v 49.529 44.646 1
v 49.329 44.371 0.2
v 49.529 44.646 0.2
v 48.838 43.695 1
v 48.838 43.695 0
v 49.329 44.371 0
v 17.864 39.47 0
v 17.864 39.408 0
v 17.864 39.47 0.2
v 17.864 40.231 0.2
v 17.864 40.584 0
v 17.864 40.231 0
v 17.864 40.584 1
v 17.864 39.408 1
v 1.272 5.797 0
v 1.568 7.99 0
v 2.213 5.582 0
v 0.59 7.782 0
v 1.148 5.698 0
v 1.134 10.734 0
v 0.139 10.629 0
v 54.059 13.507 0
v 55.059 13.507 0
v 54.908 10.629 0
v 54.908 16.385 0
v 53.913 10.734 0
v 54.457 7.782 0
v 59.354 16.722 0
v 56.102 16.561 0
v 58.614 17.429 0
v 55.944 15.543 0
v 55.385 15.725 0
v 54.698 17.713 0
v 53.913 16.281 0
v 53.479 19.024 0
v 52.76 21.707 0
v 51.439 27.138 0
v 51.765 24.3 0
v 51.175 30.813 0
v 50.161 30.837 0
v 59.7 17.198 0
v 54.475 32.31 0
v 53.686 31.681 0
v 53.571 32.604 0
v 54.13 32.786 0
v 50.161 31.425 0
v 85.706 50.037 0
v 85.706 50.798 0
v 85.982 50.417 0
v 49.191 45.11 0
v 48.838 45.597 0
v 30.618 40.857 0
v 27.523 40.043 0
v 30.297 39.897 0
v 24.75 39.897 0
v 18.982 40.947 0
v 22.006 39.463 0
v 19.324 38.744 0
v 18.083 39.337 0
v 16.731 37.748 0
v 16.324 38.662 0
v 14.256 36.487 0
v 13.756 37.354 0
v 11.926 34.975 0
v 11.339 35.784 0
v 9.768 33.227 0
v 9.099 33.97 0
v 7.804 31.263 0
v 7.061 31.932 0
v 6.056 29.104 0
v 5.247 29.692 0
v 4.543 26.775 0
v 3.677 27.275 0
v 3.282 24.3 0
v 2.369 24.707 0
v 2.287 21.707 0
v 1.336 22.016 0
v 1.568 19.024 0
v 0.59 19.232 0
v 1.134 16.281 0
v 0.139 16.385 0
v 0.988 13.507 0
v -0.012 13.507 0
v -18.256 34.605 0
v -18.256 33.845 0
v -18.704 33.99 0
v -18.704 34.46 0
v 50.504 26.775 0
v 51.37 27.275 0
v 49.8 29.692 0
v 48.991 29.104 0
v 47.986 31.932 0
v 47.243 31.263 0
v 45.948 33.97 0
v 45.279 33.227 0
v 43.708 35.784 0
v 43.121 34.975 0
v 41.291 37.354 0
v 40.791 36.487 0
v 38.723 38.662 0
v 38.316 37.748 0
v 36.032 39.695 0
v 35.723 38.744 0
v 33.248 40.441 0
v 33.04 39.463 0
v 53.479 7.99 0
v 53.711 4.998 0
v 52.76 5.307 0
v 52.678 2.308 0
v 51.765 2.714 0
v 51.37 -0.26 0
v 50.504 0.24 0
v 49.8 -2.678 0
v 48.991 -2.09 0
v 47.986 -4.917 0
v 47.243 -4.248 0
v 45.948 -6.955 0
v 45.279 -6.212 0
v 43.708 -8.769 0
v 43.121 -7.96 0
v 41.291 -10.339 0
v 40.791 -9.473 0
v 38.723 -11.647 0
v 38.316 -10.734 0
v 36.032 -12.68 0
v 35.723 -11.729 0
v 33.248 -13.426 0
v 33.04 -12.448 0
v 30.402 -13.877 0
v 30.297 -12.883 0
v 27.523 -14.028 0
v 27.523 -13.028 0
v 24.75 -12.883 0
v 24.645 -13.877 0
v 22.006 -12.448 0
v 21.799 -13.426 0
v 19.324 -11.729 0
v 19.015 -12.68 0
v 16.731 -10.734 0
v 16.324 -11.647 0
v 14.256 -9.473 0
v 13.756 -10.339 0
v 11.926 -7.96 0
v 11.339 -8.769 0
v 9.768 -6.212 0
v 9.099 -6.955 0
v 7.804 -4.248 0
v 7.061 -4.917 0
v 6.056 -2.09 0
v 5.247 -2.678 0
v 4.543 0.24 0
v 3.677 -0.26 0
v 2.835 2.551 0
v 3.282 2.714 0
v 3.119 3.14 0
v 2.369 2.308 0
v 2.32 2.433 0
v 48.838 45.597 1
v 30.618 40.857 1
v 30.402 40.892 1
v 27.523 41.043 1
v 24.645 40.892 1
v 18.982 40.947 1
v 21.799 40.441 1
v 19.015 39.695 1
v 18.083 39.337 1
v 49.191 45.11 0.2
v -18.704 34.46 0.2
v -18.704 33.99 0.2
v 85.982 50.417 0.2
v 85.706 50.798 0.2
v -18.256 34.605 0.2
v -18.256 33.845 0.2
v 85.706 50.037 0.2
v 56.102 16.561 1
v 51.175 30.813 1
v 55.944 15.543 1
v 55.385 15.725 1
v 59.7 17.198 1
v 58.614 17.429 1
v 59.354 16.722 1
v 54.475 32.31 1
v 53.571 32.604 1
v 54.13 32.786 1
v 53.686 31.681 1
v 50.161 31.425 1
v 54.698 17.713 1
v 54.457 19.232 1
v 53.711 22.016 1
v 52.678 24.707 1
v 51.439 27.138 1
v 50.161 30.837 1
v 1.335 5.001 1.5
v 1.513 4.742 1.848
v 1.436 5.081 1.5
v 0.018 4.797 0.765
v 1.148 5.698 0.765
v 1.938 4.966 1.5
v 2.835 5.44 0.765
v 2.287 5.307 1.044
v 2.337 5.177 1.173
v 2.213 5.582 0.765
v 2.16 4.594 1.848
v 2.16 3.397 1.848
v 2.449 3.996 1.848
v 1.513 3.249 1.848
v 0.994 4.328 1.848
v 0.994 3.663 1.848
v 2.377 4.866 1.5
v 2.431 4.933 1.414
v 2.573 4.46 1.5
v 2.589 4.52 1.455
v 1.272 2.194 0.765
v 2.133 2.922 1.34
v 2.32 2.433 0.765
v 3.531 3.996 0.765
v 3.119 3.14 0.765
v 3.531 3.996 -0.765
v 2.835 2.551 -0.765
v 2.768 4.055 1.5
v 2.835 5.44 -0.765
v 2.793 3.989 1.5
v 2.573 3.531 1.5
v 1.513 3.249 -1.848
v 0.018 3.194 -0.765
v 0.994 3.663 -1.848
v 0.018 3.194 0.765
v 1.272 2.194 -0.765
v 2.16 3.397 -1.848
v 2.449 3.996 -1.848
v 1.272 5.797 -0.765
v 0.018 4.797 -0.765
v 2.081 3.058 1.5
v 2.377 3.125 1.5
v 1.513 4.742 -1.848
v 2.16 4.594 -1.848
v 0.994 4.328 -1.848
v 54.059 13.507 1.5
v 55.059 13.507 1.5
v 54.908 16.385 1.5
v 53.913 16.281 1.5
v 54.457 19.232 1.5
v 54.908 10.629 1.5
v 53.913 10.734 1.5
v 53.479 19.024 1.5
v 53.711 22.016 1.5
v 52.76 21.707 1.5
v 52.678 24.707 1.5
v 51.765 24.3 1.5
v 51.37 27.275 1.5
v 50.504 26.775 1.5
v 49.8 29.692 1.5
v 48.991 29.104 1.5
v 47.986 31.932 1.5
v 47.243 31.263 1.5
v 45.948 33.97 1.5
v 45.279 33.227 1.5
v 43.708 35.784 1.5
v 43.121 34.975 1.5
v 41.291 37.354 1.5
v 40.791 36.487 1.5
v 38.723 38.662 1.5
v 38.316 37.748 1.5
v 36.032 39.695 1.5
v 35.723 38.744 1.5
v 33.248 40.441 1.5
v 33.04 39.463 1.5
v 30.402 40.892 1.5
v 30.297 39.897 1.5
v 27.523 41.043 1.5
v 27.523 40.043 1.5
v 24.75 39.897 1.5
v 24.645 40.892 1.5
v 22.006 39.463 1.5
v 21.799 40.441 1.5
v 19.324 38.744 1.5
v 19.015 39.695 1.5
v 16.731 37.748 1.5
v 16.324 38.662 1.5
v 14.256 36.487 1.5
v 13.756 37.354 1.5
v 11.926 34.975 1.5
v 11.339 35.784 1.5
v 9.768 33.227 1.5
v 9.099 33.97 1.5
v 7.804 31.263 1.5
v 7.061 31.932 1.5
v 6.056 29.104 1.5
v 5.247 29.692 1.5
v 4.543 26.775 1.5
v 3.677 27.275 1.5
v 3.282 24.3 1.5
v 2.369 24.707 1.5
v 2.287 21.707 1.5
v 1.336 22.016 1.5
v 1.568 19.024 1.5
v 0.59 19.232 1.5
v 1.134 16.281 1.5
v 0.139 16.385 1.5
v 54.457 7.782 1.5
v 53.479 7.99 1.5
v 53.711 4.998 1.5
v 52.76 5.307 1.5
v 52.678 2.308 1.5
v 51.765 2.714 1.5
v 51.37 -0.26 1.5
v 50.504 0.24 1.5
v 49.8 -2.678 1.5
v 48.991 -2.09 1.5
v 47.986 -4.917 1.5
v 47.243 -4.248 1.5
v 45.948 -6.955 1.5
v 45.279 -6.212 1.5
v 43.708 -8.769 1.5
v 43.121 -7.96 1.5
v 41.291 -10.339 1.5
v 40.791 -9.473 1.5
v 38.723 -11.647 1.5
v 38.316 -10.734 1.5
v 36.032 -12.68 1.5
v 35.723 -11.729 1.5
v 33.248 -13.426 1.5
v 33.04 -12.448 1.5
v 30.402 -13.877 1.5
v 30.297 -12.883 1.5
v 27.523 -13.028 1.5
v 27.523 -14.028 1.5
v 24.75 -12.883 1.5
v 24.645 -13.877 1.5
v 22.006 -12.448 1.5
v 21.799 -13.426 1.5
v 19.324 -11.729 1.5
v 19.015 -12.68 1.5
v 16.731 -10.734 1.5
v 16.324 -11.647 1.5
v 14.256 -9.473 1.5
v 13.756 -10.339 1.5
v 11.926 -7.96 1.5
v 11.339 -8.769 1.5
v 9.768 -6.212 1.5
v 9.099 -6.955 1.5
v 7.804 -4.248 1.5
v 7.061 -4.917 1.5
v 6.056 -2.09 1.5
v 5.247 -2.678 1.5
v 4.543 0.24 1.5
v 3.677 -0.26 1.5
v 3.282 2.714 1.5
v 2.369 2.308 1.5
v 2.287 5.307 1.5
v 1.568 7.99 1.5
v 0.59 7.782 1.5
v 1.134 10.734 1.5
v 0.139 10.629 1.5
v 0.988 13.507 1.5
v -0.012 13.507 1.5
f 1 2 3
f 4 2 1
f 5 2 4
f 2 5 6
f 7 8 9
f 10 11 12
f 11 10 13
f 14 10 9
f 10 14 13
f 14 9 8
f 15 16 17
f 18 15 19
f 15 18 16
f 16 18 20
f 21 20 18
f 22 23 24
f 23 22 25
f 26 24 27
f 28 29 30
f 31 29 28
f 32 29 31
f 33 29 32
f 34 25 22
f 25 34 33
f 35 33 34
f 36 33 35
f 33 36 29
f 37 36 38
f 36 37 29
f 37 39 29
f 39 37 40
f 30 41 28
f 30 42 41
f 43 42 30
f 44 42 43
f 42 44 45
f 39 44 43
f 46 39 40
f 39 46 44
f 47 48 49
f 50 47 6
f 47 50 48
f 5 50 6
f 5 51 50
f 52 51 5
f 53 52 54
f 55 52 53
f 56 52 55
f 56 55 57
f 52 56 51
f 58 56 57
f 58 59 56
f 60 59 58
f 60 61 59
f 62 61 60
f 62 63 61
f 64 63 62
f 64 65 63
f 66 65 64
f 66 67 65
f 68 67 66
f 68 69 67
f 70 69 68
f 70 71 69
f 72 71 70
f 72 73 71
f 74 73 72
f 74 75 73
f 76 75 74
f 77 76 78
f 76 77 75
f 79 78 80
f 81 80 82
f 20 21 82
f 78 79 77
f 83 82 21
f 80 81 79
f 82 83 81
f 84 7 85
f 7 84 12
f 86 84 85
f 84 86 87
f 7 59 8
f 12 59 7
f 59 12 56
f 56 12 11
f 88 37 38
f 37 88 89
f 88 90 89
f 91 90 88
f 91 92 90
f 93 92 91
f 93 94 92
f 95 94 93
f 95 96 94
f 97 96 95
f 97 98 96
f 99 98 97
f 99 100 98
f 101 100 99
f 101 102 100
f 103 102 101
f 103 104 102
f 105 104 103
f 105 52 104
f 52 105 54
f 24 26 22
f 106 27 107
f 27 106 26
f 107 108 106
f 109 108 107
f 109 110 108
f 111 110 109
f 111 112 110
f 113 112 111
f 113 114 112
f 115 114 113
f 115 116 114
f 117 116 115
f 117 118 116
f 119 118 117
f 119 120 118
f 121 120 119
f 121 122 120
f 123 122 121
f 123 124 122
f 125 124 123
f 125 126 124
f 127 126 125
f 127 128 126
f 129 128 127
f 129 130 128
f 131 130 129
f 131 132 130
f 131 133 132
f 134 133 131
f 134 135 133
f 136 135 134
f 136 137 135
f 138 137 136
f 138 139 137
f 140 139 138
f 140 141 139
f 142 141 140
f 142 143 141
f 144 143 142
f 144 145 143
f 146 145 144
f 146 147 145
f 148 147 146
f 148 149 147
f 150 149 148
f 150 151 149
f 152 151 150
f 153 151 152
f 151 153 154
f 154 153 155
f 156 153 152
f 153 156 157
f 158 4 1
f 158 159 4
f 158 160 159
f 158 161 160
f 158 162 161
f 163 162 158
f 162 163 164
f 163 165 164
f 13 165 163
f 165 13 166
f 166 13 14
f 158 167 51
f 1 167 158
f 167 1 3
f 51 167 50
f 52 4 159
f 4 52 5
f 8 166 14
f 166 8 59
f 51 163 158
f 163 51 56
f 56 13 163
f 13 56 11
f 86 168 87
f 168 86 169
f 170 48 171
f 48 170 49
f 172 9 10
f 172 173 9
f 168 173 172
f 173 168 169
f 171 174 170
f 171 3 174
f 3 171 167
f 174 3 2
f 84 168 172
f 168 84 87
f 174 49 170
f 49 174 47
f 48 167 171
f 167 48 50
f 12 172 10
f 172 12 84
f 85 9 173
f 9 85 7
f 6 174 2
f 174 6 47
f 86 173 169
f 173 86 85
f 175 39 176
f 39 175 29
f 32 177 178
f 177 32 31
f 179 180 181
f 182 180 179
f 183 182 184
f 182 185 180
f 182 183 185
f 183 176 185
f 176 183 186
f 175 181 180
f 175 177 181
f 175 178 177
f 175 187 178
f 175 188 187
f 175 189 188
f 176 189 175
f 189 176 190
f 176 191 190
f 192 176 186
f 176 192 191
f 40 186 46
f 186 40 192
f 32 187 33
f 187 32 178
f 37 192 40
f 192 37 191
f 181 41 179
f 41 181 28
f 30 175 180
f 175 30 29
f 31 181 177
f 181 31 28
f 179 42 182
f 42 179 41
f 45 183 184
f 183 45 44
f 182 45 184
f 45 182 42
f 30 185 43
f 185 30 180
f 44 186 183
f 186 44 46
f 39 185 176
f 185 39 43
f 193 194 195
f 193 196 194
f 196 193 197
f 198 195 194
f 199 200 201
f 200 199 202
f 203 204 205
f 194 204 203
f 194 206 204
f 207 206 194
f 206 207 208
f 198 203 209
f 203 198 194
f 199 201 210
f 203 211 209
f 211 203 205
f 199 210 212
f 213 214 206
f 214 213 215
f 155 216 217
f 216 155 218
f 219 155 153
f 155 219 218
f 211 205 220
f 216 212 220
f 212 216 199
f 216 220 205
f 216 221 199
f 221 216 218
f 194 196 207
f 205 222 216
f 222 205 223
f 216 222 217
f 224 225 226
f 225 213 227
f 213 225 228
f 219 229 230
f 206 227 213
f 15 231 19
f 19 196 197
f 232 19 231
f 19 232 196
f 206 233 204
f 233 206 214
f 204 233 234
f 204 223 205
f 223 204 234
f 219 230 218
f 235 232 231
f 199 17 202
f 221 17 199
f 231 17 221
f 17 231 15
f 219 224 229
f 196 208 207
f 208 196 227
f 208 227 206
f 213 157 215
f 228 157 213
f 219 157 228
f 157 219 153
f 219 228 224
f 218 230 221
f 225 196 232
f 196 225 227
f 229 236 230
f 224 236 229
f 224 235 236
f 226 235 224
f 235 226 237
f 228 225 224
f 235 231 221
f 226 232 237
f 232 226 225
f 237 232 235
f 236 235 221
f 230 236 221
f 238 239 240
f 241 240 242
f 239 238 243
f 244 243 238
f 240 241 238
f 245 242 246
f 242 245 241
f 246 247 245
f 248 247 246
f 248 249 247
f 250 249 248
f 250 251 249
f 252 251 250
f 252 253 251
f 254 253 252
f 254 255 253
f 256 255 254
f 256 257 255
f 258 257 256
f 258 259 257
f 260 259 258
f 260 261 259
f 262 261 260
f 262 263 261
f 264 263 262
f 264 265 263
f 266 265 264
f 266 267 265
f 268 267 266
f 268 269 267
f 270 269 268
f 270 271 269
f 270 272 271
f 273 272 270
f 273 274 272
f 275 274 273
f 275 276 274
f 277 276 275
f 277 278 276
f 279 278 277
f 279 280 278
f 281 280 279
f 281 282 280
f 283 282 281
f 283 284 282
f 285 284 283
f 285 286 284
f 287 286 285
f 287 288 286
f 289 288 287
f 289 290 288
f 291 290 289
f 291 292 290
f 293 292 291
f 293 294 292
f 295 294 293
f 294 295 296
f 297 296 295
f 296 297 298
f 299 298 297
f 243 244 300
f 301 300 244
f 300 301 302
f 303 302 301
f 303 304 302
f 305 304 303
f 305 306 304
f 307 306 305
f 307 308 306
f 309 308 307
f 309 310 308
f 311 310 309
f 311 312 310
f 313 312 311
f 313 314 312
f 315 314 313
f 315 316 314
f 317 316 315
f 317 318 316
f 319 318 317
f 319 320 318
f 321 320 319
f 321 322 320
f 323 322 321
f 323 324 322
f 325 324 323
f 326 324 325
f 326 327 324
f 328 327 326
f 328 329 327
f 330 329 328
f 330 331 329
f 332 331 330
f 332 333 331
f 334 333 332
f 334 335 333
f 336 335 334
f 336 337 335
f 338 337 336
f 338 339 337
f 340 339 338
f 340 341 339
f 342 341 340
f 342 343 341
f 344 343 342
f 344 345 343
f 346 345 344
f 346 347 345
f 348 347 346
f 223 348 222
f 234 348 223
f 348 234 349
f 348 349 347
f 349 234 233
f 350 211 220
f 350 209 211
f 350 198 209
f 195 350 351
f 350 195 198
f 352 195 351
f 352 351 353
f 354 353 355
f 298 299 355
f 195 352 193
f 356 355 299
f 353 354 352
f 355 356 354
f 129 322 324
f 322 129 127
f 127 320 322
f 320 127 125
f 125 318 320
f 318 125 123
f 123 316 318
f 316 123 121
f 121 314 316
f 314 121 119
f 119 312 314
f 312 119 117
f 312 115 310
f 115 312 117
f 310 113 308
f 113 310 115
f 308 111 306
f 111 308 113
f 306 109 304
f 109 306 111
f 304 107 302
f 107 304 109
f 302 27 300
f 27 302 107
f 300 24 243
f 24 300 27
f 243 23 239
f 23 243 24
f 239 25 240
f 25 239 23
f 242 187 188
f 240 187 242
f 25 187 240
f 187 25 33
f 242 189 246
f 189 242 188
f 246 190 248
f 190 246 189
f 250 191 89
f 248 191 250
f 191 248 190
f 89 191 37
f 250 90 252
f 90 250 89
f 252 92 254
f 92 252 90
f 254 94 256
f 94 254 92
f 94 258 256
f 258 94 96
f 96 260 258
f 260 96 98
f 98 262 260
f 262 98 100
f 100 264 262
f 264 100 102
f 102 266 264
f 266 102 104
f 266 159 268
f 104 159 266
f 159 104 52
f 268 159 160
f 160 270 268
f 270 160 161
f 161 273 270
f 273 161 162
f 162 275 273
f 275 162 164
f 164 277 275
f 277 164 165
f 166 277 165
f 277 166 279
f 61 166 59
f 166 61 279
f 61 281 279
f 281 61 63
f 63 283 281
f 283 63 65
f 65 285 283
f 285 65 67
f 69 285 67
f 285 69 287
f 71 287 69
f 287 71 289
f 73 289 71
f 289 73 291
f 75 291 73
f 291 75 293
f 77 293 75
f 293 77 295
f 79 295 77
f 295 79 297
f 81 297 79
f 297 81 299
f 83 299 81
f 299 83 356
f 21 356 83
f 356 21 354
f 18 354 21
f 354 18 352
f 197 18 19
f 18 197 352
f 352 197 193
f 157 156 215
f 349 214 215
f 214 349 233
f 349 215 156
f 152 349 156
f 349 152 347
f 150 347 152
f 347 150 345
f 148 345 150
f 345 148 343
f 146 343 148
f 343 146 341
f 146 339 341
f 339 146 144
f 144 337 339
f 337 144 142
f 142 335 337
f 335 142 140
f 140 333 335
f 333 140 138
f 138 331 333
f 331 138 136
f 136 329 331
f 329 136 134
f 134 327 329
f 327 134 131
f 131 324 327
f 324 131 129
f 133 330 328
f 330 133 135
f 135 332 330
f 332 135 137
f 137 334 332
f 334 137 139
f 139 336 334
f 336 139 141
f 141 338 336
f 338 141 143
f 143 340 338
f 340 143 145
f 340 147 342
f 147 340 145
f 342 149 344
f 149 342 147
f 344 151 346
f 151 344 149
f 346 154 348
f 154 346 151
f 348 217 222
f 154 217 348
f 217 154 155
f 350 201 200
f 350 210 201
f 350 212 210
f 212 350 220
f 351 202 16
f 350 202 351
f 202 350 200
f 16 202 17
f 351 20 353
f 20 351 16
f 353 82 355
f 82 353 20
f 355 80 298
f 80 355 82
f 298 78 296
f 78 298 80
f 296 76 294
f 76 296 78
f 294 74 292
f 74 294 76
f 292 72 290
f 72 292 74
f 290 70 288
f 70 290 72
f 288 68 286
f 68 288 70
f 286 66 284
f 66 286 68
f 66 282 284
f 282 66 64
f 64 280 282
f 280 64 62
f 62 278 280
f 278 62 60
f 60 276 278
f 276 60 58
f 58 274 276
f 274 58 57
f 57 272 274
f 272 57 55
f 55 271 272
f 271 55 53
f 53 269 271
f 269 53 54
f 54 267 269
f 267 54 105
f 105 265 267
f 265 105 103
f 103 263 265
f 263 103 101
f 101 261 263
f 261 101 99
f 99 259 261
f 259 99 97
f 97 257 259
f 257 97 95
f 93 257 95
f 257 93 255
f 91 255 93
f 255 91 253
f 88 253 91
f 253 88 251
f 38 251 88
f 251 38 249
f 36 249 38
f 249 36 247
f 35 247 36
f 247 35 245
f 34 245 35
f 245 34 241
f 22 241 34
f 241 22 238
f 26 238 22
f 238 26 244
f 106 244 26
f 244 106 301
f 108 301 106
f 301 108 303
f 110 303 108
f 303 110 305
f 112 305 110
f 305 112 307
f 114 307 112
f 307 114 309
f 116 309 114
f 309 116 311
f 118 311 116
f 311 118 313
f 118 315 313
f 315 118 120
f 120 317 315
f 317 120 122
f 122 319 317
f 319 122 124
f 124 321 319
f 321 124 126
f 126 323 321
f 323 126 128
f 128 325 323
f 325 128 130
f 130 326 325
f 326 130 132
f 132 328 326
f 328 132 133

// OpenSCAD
threshold = 1e-5;
workarea = 50;


function  AcmeSolver(f0, f1, f2, ifind = undef, maxi = 6000) =
let (
find = ifind == undef ? 
    (featurecenter(f0)   + featurecenter(f1)  
    + featurecenter(f2)  ) /3: ifind, 
d0 =distancetofeature(f0, find), 
nf0 = normaltofeature(f0, find),
d1 = distancetofeature(f1, find), 
nf1 = normaltofeature(f1, find),
d2 = distancetofeature(f2, find), 
nf2 = normaltofeature(f2, find),
sum = abs(d0 - d1) + abs(d1 - d2) + abs(d2 - d0), 
avrg = (d0 + d2 +    d1) / 3,  
cf0 = (find + nf0 * (max(0, d0) - avrg) * 0.999),  
cf1 = (    find + nf1 * (max(0, d1) - avrg) * 0.999),  
cf2 = (find + nf2 * (    max(0, d2) - avrg) * 0.999),  
newfind = (cf0 + cf1 + cf2) / 3 )
sum < threshold || maxi < 0 ? 
[find, avrg,   sum]
:  AcmeSolver(f0,
f1, f2, newfind, maxi - 1);

function featurecenter(feat) = 
len(feat) == 2 && len(feat[0]) ==  undef ? feat :
len(feat) == 3 && len(feat[0]) == undef ? [feat.x,feat.y] : 
len(feat) == 2 && len(feat[0]) == 2 ? (feat[0] + feat[1]) /2 :
len(feat) == 2 && len(feat[0]) == 2 ? (feat[0] + feat[1]+feat[2] + feat[3]) /  4 : [0, 0];

function distancetofeature(feat, find) = 
len(feat) == 2 && len(feat[0]) ==  undef ? norm(feat - find) : 
len(feat) == 3 && len(feat[0]) == undef ?  distancetocircle(feat, find) : 
len(feat) == 2 && len(feat[0]) == 2 ?  distancetoline(feat, find) : 
len(feat) == 4 && len(feat[0]) == 2 ?  distancetosquare(feat, find) :
0;

function normaltofeature(feat, find) = 
len(feat) == 2 && len(feat[0]) ==  undef ? normaltopoint(feat, find) :
 len(feat) == 3 && len(feat[0]) ==  undef ? normaltocircle(feat, find) : 
len(feat) == 2 && len(feat[0]) ==  2 ? normaltoline(feat, find) :
len(feat) == 4 && len(feat[0]) ==  2 ? normaltosquare(feat, find) :
 0;

function distancetopoint(point, find) = norm(point - find);

function distancetocircle(circle, find) = norm([circle.x, circle.y] -
  find) - circle[2];

function distancetoline(line, p) =
let (a = line[0], b = line[1], pa = p - a, ba = b - a, h =  ((pa * ba) /
  (ba * ba)))norm(pa - ba * h);

function distancetosquare(square, p) =min (
distancetosegment([square[0],square[1]],p),
distancetosegment([square[1],square[2]],p),
distancetosegment([square[2],square[3]],p),
distancetosegment([square[3],square[0]],p)

);

function distancetosegment(line, p) =
let (a = line[0], b = line[1], pa = p - a, ba = b - a, h =  clamp((pa * ba) /
  (ba * ba)))
norm(pa - ba * h);
function clamp(a, b = 0, c = 1) = min(max(a, b), c); 

function normaltopoint(point, find) = (point - find) / norm(point -
  find);

function normaltocircle(circle, find) = ([circle.x, circle.y] - find) /
norm([circle.x, circle.y] - find);

function normaltoline(line, find) =
let (a = line[0], b = line[1], dtl2 = distancetoline(line, find))
un([distancetoline(line, find + [-1, 0]) - dtl2, distancetoline(line,
  find + [0, -1]) - dtl2]);
function normaltosegment(line, find) =
let (a = line[0], b = line[1],c=un(a-b))[-c.y,c.x];
 

function normaltosquare(square, find) =
let (  base = distancetosquare(square, find))
un([distancetosquare(square, find + [-1, 0]) - base, distancetosquare(square, find+ [0, -1]) - base]);
function un(v) = v / max(1e-15, norm(v));

// demo code

function allines(f0,f1,f2)=isline(feature0)&&isline(feature1)&&isline(feature2);
function isline(feat)=len(feat) == 2 && len(feat[0]) == 2 ?true:false;
function randomfeature(i) =
let (s0 = i==undef? round( rnd(3)):i
)
(s0 == 0) ? [rnd(workarea), rnd(workarea), rnd(1, workarea * 0.5)] :
(s0 == 1) ? [rnd(workarea), rnd(workarea)] : 
(s0 == 2) ? [[rnd(  workarea), rnd(workarea)], [rnd(workarea), rnd(workarea)]] :
(s0 == 3) ? let(p1=[rnd(workarea), rnd(workarea)],p2=p1+[rnd(workarea)/2, rnd(workarea)/2],r=rnd(360),p3=(p1+p2)/2)
[rotp(r,p1,p3),rotp(r,[p2.x,p1.y],p3),rotp(r,p2,p3),rotp(r,[p1.x,p2.y],p3) ] :
 ["err"];

function rotp(r,ip,p3)=
let( p=ip-p3, s = sin(r),
  c = cos(r),
    xnew = p.x * c - p.y * s,
    ynew = p.x * s + p.y * c)
[xnew,ynew]+p3
;
module showfeature(feat) {
  color("black") {
    if (len(feat) == 2 && len(feat[0]) == undef) {
      echo(" point ", feat);
      translate(feat) sphere(2);
    }
    if (len(feat) == 3 && len(feat[0]) == undef) {
      echo(" circle ", feat);
      linear_extrude(1)translate([feat.x, feat.y]) difference() {
        circle(feat[2]);
        circle(feat[2] - 1);
      }
    }
    if (len(feat) == 2 && len(feat[0]) == 2) {
      echo(" line ", feat);
      linear_extrude(1)hull() {
        translate(feat[0]) circle(1);
        translate(feat[1]) circle(1);
      }
      n1 = un(feat[0] - feat[1]);
      linear_extrude(0.2)hull() {
        translate(feat[0] + n1 * workarea*0.75) circle(0.4);
        translate(feat[1] - n1 * workarea*0.75) circle(0.4);
      }
    }
if (len(feat) == 4 && len(feat[0]) == 2) {
      echo(" square ", feat);
      linear_extrude(1)hull() {
        translate(feat[0]) circle(0.5);
        translate(feat[1]) circle(0.5);
      }
 linear_extrude(1)hull() {
        translate(feat[1]) circle(0.5);
        translate(feat[2]) circle(0.5);
      }
      linear_extrude(1)hull() {
        translate(feat[2]) circle(0.5);
        translate(feat[3]) circle(0.5);
      }
      linear_extrude(1)hull() {
        translate(feat[3]) circle(0.5);
        translate(feat[0]) circle(0.5);
      }
     
    }
  }
}
module ring(d, i = 1) {
  linear_extrude(i)
  {
    translate(d[0]) difference() {
      circle(d[1], $fn = 60);
      circle(max(0,d[1] - 1), $fn = 60);
    }
  }
}

function rnd(a = 1, b = 0, s = []) = s == [] ? (rands(min(a, b), max(
  a, b), 1)[0]) : (rands(min(a, b), max(a, b), 1, s)[0]);


module dud(){
feature0 = randomfeature();
feature1 = randomfeature();
feature2 = randomfeature(3);
showfeature(feature0);
showfeature(feature1);
showfeature(feature2);
// try fo fit from midpoint
d =  AcmeSolver(feature0, feature1, feature2);
//[center,radius, fit]

if (d[2] < threshold  ){
echo(" Found Internal ", d);
  color("red") ring(d, 1.5);
}
else {
 color("yellow") ring(d);
  if (d[2] < workarea*0.1) {
    echo(" Found no internal solution in time. Best fit : ", d[2]);
    echo(d);    
  }
  else {
    echo(" Found no internal solution in time. Best approximation : ");
    echo(d);   
  }

// try to fit from ouside
for (i = [45: 360: 360]) {
  cme = [sin(i) * workarea * 10, cos(i) * workarea * 10];
  de =  AcmeSolver(feature0, feature1, feature2, cme,1500);
  if (norm(d[0] - de[0]) > threshold) {
    if (de[2] < threshold) {
      color([1, rnd(), rnd()]) ring(de,0.9);
      echo(" Found External ",de);
    }
    else {
      echo(" Found no external solution in time ");
    }
  }
}
// try to fit from Random State
for (i = [0: 2]) {
  cme = [rnd(-workarea,workarea*2),rnd(-workarea,workarea*2)];
  de =  AcmeSolver(feature0, feature1, feature2, cme,1500);
  if (norm(d[0] - de[0]) > threshold) {
    if (de[2] < threshold) {
      color([1, rnd(), rnd()]) ring(de);
      echo(" Found Random State solution ",de);
    }
    else {
      echo(" Found no Random State solution in time ");
    }
  }
}

}

}
 dud();

//
//for (i=[0:4],j=[0:2]){
//translate([i*workarea*1.52,j*workarea*1.52]){intersection(){dud();translate([-workarea/2,-workarea/2,-workarea/2])cube(workarea*2);}}}
